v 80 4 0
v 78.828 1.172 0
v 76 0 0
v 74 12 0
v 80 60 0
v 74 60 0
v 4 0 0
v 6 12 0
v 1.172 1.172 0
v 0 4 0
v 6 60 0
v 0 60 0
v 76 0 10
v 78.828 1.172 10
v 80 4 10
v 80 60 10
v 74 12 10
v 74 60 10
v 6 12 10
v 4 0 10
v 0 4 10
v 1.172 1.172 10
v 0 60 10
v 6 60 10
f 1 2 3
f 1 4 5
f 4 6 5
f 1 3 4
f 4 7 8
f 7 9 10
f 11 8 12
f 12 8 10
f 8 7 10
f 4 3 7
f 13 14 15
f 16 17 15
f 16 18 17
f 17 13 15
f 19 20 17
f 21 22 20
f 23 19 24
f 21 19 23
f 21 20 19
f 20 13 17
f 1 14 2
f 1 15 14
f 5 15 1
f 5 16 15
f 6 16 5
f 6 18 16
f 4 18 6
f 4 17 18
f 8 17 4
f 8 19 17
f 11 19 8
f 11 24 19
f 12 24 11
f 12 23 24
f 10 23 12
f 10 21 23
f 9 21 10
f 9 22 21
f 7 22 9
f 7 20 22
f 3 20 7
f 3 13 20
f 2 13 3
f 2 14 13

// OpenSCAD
$fn = 32;

// ----------------------------------------------------------------------
// Heat sink frame: 80 x 60 mm frame, 6 mm walls
// ----------------------------------------------------------------------

// --- parameters (mm) ---
profile_height = 10;      // extrusion height
profile_points = 12;      // points of the closed outline

profile = [[0, 4], [1.172, 1.172], [4, 0], [76, 0], [78.828, 1.172], [80, 4], [80, 60], [74, 60], [74, 12], [6, 12], [6, 60], [0, 60]];  // single closed polygon, 12 points, counter clockwise

// --- the one profile operation ---
linear_extrude(height = profile_height) polygon(points = profile);
